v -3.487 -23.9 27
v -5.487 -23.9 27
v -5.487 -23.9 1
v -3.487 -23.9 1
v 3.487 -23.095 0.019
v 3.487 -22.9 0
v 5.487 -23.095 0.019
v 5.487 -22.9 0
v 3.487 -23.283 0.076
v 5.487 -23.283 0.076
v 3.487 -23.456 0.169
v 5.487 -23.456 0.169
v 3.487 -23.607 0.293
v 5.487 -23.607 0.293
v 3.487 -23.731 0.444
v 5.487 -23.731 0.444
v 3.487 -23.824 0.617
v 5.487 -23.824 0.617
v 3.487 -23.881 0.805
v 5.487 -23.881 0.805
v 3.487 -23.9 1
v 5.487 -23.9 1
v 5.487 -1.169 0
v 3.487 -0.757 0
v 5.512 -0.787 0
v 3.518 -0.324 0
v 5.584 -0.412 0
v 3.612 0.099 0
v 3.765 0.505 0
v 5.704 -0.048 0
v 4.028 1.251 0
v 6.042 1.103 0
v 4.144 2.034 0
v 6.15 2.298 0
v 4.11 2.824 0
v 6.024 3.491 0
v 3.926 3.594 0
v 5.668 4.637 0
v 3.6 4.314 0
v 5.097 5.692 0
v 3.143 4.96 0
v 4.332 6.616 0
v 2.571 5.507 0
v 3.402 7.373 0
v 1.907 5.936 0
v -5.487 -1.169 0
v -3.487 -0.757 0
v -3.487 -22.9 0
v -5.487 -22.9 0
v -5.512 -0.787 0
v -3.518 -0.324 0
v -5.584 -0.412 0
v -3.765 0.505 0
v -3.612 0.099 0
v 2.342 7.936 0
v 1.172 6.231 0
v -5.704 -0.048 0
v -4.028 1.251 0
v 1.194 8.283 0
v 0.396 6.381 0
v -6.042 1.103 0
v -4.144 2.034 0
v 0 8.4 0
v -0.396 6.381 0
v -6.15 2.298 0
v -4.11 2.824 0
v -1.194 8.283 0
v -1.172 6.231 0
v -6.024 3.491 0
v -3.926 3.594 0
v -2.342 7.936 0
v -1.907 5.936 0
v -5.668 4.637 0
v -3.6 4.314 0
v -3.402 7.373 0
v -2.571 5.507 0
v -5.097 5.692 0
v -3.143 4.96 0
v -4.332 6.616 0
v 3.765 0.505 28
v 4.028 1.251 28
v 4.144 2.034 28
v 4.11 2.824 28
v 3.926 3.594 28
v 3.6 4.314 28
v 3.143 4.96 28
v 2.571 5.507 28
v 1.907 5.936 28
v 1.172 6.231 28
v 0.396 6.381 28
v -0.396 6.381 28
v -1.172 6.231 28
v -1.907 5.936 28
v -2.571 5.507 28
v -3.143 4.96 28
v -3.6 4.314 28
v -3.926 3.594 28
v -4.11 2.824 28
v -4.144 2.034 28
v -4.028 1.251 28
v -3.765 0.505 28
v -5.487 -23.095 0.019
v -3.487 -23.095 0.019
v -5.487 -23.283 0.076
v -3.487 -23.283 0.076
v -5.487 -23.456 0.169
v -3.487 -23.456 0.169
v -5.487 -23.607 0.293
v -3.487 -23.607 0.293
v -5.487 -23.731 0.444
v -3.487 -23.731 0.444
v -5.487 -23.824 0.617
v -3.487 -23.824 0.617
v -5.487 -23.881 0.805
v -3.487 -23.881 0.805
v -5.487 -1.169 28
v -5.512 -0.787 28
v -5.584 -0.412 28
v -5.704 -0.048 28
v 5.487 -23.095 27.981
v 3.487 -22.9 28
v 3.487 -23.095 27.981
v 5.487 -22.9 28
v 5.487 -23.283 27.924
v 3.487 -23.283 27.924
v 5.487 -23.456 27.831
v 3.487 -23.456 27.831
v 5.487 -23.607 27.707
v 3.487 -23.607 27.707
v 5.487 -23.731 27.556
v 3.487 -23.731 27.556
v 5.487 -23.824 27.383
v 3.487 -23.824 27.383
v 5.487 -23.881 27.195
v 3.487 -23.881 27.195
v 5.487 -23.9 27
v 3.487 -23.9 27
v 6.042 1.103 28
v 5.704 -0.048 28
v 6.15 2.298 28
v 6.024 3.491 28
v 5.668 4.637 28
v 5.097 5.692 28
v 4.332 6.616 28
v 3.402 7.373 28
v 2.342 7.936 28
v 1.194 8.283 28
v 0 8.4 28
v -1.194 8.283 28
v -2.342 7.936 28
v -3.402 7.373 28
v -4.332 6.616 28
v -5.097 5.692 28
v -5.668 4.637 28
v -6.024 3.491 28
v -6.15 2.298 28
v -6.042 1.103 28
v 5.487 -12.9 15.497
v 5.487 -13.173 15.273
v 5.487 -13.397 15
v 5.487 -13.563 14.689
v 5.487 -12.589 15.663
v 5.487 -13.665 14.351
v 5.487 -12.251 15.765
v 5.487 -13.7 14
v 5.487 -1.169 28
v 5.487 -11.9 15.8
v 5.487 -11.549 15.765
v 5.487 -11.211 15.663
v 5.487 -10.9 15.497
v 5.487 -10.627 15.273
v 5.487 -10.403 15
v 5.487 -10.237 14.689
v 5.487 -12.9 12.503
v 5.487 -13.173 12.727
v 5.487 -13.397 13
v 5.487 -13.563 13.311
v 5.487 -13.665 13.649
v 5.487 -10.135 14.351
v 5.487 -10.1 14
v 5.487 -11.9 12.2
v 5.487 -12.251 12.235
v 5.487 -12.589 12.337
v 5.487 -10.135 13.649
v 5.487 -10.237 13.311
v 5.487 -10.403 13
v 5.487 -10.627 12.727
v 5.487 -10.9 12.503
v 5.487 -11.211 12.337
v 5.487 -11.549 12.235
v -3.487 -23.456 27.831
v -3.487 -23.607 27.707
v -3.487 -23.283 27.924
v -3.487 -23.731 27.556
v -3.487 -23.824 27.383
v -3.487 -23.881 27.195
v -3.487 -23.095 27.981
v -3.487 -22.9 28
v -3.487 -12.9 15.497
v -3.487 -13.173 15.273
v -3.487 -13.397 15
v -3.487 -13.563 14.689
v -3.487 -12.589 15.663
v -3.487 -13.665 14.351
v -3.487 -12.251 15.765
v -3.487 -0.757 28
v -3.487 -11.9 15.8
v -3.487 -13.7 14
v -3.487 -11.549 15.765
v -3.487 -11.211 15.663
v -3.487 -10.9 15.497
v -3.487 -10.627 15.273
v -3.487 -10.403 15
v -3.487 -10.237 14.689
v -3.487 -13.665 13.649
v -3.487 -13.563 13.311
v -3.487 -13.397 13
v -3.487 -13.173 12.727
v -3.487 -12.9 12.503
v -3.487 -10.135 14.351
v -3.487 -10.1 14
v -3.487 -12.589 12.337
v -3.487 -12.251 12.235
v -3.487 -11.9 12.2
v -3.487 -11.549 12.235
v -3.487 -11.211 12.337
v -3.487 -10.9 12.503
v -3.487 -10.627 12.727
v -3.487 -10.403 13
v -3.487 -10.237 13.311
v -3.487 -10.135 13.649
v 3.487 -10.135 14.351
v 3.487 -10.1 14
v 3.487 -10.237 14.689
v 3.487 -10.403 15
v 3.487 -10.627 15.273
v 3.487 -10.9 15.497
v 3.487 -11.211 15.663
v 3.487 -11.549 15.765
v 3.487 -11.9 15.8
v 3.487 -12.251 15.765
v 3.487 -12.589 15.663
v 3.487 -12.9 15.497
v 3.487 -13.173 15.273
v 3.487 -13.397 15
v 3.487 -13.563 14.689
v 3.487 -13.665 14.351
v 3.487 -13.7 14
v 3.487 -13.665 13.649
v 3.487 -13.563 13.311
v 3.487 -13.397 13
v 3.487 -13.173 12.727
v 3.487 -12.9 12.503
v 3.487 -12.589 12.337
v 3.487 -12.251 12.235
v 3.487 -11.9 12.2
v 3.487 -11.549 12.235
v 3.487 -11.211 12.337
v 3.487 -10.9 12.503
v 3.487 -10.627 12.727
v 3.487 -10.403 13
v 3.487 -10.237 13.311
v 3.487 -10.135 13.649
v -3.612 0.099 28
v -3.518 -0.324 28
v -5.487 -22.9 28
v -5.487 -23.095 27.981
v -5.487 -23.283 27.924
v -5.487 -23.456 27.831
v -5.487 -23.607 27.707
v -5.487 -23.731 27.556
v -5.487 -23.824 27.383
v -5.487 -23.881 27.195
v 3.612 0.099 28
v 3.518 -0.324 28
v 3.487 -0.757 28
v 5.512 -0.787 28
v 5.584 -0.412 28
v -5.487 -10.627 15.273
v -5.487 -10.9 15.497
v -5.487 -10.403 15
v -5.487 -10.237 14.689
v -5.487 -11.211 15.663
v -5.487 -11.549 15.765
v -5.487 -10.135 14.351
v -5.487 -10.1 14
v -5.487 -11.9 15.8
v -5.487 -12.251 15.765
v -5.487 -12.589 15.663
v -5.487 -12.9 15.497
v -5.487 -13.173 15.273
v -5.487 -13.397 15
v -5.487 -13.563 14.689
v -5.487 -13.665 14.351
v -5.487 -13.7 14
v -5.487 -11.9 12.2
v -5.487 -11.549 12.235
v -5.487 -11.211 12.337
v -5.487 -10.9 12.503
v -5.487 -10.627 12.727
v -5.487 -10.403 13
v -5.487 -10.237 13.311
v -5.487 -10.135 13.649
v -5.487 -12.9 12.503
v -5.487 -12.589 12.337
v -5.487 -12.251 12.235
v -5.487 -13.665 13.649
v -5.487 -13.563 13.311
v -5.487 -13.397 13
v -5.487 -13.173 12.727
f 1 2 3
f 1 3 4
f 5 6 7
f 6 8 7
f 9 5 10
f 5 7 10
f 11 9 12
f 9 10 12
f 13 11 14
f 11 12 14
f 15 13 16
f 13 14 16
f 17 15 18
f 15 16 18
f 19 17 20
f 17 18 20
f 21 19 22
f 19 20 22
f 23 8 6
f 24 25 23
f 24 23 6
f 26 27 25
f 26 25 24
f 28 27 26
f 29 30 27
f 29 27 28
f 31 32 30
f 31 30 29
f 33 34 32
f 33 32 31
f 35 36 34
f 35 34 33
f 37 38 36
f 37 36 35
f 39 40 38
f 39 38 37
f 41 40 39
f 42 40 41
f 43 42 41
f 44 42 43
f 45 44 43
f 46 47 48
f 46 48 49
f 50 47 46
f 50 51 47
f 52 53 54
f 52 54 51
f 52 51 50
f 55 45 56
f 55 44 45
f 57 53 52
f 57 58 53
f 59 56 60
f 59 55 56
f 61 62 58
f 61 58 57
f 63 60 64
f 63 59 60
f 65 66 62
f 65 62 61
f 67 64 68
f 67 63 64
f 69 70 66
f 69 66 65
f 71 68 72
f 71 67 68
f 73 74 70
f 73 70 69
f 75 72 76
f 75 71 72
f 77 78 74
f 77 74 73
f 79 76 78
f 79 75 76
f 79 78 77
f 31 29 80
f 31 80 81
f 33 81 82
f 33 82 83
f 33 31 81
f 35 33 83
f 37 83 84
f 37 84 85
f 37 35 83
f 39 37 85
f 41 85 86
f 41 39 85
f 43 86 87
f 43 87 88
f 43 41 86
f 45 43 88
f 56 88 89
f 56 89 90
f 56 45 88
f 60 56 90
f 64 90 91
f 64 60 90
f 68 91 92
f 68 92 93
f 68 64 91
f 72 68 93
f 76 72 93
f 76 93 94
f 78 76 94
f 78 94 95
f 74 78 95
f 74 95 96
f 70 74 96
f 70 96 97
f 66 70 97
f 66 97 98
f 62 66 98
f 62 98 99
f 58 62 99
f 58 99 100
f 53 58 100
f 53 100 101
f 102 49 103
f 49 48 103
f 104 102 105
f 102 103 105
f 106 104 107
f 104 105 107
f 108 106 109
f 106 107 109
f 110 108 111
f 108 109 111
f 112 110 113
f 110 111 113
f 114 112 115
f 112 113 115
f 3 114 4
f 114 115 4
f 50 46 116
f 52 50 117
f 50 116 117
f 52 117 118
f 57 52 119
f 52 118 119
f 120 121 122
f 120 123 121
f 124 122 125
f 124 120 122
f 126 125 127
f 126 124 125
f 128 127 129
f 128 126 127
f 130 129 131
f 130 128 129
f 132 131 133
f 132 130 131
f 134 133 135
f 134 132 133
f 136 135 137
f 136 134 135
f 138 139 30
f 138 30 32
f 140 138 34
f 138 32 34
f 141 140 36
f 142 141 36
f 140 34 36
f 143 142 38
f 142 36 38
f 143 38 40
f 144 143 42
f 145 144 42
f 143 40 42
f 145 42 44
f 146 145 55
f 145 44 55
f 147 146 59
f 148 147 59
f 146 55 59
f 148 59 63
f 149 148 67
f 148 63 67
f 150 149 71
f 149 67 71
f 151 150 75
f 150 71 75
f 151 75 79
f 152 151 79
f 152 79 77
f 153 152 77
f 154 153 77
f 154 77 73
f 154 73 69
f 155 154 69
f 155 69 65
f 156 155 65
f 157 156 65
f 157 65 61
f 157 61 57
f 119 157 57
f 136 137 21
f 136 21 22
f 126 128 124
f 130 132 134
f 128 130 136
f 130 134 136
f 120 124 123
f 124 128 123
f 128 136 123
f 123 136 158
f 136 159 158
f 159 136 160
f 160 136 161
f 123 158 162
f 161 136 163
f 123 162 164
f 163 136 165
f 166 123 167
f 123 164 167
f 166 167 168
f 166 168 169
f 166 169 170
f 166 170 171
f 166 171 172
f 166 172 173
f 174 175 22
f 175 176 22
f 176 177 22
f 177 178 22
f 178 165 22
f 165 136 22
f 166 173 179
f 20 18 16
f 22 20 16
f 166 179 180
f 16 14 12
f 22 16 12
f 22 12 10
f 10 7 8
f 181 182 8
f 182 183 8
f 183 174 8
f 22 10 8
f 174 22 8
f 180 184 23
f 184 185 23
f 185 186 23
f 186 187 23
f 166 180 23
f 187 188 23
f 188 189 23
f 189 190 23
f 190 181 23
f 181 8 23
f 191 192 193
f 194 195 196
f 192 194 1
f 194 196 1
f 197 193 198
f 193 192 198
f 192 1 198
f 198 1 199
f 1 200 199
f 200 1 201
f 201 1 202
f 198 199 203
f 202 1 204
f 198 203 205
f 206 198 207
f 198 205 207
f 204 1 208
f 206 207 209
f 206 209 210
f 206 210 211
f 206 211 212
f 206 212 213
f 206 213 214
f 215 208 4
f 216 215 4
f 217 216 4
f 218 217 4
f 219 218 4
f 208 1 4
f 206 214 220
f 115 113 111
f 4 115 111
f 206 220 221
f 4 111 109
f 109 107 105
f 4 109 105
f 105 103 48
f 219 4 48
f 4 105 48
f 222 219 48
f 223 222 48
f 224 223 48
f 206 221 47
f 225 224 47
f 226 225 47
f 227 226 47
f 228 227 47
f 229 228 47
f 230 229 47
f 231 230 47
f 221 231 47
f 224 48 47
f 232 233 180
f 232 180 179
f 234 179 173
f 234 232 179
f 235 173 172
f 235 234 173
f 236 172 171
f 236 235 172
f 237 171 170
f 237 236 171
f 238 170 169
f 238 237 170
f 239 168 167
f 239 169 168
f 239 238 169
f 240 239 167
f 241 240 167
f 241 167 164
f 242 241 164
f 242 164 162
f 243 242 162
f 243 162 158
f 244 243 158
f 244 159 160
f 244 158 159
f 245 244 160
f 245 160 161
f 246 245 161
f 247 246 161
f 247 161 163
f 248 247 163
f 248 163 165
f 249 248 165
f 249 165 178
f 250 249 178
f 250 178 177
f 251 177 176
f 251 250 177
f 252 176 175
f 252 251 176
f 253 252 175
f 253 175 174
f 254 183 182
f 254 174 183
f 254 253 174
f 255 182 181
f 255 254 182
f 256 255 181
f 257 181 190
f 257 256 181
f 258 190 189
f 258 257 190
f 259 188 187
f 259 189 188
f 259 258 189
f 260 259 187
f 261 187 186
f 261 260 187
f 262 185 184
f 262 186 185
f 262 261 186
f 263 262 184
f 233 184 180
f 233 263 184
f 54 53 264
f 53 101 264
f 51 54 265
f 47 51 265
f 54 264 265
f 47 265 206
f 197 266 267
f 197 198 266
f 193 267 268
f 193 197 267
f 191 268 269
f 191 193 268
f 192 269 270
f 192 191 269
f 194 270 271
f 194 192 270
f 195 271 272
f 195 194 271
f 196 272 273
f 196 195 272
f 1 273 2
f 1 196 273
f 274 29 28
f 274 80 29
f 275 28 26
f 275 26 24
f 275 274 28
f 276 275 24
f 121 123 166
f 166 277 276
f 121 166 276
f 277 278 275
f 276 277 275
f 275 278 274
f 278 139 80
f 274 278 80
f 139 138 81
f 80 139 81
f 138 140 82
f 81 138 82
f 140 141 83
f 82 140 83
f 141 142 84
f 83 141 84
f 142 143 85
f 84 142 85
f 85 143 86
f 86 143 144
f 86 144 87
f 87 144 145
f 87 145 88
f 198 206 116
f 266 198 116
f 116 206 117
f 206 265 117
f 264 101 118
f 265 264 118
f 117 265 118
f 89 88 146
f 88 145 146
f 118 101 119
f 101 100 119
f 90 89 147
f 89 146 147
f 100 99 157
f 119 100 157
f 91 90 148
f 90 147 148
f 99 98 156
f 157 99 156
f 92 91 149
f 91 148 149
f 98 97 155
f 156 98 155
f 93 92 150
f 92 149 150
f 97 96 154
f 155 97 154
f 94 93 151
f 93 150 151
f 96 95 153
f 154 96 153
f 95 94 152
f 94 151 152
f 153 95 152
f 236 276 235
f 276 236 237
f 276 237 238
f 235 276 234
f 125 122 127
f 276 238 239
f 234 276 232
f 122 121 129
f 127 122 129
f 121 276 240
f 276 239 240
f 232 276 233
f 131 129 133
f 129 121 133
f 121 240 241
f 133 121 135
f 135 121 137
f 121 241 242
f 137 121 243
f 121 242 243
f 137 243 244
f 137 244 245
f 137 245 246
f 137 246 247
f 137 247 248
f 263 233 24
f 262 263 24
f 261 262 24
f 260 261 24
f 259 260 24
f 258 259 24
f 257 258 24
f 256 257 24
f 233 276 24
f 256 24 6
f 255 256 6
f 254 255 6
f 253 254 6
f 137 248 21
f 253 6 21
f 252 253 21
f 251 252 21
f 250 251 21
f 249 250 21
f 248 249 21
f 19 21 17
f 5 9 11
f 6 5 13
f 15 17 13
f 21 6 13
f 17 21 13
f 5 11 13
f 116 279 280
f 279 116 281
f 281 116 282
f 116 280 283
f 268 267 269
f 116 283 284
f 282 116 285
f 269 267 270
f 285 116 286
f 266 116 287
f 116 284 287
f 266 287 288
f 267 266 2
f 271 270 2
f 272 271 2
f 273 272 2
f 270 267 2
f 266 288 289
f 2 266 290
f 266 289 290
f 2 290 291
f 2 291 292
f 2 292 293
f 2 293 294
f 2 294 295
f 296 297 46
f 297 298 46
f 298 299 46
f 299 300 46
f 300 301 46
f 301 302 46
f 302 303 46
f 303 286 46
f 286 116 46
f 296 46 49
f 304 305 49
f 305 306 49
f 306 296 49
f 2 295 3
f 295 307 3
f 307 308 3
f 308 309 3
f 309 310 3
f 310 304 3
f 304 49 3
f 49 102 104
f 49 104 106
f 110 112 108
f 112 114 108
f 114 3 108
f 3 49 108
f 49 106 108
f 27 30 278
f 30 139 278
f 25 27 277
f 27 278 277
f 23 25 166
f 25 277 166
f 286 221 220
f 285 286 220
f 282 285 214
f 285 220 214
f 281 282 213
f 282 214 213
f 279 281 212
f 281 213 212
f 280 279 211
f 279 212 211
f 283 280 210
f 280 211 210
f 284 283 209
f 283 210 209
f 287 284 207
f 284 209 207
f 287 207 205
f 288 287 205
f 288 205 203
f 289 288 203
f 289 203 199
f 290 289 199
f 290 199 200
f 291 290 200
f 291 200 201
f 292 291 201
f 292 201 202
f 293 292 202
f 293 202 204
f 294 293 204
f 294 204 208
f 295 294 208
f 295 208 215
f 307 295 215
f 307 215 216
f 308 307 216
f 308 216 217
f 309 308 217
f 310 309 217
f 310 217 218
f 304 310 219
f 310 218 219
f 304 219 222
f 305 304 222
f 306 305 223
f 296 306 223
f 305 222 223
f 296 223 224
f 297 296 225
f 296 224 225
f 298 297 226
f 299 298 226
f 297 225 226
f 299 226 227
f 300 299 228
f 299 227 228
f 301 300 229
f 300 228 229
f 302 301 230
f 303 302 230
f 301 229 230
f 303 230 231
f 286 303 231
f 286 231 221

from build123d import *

# Parameters (mm, degrees)
PAD_DEPTH         = 28
SKETCH001_R       = 1.8
POCKET_DEPTH      = 6.151
POCKET_DEPTH_BACK = -6.151
FILLET_R          = 3
FILLET001_R       = 1


with BuildPart() as part:
    # Sketch → Pad (new body)
    with BuildSketch(Plane.XY):
        with BuildLine():
            ThreePointArc((3.487119, 0), (0, 6.4), (-3.487119, 0))
            Line((-3.487119, -23.9), (-3.487119, 0))
            Line((-5.487119, -23.9), (-3.487119, -23.9))
            Line((-5.487119, -0.527413), (-5.487119, -23.9))
            ThreePointArc((5.487119, -0.527413), (0, 8.4), (-5.487119, -0.527413))
            Line((5.487119, -23.9), (5.487119, -0.527413))
            Line((3.487119, -23.9), (5.487119, -23.9))
            Line((3.487119, 0), (3.487119, -23.9))
        make_face()
    extrude(amount=PAD_DEPTH)

    # Sketch001 → Pocket (cut, two sides)
    with BuildSketch(Plane.YZ) as pocket_sk:
        with Locations((-11.9, 14)):
            Circle(SKETCH001_R)
    extrude(amount=-POCKET_DEPTH, mode=Mode.SUBTRACT)
    extrude(pocket_sk.sketch, amount=-POCKET_DEPTH_BACK, mode=Mode.SUBTRACT)

    # Fillet
    fillet_edges = [part.edges().sort_by_distance(p)[0] for p in [
        (3.487119, 0, 14),
        (-3.487119, 0, 14),
        (5.487119, -0.527413, 14),
        (-5.487119, -0.527413, 14),
    ]]
    fillet(fillet_edges, radius=FILLET_R)

    # Fillet001
    fillet001_edges = [part.edges().sort_by_distance(p)[0] for p in [
        (4.487119, -23.9, 28),
        (-4.487119, -23.9, 28),
        (-4.487119, -23.9, 0),
        (4.487119, -23.9, 0),
    ]]
    fillet(fillet001_edges, radius=FILLET001_R)


solid = part.part
